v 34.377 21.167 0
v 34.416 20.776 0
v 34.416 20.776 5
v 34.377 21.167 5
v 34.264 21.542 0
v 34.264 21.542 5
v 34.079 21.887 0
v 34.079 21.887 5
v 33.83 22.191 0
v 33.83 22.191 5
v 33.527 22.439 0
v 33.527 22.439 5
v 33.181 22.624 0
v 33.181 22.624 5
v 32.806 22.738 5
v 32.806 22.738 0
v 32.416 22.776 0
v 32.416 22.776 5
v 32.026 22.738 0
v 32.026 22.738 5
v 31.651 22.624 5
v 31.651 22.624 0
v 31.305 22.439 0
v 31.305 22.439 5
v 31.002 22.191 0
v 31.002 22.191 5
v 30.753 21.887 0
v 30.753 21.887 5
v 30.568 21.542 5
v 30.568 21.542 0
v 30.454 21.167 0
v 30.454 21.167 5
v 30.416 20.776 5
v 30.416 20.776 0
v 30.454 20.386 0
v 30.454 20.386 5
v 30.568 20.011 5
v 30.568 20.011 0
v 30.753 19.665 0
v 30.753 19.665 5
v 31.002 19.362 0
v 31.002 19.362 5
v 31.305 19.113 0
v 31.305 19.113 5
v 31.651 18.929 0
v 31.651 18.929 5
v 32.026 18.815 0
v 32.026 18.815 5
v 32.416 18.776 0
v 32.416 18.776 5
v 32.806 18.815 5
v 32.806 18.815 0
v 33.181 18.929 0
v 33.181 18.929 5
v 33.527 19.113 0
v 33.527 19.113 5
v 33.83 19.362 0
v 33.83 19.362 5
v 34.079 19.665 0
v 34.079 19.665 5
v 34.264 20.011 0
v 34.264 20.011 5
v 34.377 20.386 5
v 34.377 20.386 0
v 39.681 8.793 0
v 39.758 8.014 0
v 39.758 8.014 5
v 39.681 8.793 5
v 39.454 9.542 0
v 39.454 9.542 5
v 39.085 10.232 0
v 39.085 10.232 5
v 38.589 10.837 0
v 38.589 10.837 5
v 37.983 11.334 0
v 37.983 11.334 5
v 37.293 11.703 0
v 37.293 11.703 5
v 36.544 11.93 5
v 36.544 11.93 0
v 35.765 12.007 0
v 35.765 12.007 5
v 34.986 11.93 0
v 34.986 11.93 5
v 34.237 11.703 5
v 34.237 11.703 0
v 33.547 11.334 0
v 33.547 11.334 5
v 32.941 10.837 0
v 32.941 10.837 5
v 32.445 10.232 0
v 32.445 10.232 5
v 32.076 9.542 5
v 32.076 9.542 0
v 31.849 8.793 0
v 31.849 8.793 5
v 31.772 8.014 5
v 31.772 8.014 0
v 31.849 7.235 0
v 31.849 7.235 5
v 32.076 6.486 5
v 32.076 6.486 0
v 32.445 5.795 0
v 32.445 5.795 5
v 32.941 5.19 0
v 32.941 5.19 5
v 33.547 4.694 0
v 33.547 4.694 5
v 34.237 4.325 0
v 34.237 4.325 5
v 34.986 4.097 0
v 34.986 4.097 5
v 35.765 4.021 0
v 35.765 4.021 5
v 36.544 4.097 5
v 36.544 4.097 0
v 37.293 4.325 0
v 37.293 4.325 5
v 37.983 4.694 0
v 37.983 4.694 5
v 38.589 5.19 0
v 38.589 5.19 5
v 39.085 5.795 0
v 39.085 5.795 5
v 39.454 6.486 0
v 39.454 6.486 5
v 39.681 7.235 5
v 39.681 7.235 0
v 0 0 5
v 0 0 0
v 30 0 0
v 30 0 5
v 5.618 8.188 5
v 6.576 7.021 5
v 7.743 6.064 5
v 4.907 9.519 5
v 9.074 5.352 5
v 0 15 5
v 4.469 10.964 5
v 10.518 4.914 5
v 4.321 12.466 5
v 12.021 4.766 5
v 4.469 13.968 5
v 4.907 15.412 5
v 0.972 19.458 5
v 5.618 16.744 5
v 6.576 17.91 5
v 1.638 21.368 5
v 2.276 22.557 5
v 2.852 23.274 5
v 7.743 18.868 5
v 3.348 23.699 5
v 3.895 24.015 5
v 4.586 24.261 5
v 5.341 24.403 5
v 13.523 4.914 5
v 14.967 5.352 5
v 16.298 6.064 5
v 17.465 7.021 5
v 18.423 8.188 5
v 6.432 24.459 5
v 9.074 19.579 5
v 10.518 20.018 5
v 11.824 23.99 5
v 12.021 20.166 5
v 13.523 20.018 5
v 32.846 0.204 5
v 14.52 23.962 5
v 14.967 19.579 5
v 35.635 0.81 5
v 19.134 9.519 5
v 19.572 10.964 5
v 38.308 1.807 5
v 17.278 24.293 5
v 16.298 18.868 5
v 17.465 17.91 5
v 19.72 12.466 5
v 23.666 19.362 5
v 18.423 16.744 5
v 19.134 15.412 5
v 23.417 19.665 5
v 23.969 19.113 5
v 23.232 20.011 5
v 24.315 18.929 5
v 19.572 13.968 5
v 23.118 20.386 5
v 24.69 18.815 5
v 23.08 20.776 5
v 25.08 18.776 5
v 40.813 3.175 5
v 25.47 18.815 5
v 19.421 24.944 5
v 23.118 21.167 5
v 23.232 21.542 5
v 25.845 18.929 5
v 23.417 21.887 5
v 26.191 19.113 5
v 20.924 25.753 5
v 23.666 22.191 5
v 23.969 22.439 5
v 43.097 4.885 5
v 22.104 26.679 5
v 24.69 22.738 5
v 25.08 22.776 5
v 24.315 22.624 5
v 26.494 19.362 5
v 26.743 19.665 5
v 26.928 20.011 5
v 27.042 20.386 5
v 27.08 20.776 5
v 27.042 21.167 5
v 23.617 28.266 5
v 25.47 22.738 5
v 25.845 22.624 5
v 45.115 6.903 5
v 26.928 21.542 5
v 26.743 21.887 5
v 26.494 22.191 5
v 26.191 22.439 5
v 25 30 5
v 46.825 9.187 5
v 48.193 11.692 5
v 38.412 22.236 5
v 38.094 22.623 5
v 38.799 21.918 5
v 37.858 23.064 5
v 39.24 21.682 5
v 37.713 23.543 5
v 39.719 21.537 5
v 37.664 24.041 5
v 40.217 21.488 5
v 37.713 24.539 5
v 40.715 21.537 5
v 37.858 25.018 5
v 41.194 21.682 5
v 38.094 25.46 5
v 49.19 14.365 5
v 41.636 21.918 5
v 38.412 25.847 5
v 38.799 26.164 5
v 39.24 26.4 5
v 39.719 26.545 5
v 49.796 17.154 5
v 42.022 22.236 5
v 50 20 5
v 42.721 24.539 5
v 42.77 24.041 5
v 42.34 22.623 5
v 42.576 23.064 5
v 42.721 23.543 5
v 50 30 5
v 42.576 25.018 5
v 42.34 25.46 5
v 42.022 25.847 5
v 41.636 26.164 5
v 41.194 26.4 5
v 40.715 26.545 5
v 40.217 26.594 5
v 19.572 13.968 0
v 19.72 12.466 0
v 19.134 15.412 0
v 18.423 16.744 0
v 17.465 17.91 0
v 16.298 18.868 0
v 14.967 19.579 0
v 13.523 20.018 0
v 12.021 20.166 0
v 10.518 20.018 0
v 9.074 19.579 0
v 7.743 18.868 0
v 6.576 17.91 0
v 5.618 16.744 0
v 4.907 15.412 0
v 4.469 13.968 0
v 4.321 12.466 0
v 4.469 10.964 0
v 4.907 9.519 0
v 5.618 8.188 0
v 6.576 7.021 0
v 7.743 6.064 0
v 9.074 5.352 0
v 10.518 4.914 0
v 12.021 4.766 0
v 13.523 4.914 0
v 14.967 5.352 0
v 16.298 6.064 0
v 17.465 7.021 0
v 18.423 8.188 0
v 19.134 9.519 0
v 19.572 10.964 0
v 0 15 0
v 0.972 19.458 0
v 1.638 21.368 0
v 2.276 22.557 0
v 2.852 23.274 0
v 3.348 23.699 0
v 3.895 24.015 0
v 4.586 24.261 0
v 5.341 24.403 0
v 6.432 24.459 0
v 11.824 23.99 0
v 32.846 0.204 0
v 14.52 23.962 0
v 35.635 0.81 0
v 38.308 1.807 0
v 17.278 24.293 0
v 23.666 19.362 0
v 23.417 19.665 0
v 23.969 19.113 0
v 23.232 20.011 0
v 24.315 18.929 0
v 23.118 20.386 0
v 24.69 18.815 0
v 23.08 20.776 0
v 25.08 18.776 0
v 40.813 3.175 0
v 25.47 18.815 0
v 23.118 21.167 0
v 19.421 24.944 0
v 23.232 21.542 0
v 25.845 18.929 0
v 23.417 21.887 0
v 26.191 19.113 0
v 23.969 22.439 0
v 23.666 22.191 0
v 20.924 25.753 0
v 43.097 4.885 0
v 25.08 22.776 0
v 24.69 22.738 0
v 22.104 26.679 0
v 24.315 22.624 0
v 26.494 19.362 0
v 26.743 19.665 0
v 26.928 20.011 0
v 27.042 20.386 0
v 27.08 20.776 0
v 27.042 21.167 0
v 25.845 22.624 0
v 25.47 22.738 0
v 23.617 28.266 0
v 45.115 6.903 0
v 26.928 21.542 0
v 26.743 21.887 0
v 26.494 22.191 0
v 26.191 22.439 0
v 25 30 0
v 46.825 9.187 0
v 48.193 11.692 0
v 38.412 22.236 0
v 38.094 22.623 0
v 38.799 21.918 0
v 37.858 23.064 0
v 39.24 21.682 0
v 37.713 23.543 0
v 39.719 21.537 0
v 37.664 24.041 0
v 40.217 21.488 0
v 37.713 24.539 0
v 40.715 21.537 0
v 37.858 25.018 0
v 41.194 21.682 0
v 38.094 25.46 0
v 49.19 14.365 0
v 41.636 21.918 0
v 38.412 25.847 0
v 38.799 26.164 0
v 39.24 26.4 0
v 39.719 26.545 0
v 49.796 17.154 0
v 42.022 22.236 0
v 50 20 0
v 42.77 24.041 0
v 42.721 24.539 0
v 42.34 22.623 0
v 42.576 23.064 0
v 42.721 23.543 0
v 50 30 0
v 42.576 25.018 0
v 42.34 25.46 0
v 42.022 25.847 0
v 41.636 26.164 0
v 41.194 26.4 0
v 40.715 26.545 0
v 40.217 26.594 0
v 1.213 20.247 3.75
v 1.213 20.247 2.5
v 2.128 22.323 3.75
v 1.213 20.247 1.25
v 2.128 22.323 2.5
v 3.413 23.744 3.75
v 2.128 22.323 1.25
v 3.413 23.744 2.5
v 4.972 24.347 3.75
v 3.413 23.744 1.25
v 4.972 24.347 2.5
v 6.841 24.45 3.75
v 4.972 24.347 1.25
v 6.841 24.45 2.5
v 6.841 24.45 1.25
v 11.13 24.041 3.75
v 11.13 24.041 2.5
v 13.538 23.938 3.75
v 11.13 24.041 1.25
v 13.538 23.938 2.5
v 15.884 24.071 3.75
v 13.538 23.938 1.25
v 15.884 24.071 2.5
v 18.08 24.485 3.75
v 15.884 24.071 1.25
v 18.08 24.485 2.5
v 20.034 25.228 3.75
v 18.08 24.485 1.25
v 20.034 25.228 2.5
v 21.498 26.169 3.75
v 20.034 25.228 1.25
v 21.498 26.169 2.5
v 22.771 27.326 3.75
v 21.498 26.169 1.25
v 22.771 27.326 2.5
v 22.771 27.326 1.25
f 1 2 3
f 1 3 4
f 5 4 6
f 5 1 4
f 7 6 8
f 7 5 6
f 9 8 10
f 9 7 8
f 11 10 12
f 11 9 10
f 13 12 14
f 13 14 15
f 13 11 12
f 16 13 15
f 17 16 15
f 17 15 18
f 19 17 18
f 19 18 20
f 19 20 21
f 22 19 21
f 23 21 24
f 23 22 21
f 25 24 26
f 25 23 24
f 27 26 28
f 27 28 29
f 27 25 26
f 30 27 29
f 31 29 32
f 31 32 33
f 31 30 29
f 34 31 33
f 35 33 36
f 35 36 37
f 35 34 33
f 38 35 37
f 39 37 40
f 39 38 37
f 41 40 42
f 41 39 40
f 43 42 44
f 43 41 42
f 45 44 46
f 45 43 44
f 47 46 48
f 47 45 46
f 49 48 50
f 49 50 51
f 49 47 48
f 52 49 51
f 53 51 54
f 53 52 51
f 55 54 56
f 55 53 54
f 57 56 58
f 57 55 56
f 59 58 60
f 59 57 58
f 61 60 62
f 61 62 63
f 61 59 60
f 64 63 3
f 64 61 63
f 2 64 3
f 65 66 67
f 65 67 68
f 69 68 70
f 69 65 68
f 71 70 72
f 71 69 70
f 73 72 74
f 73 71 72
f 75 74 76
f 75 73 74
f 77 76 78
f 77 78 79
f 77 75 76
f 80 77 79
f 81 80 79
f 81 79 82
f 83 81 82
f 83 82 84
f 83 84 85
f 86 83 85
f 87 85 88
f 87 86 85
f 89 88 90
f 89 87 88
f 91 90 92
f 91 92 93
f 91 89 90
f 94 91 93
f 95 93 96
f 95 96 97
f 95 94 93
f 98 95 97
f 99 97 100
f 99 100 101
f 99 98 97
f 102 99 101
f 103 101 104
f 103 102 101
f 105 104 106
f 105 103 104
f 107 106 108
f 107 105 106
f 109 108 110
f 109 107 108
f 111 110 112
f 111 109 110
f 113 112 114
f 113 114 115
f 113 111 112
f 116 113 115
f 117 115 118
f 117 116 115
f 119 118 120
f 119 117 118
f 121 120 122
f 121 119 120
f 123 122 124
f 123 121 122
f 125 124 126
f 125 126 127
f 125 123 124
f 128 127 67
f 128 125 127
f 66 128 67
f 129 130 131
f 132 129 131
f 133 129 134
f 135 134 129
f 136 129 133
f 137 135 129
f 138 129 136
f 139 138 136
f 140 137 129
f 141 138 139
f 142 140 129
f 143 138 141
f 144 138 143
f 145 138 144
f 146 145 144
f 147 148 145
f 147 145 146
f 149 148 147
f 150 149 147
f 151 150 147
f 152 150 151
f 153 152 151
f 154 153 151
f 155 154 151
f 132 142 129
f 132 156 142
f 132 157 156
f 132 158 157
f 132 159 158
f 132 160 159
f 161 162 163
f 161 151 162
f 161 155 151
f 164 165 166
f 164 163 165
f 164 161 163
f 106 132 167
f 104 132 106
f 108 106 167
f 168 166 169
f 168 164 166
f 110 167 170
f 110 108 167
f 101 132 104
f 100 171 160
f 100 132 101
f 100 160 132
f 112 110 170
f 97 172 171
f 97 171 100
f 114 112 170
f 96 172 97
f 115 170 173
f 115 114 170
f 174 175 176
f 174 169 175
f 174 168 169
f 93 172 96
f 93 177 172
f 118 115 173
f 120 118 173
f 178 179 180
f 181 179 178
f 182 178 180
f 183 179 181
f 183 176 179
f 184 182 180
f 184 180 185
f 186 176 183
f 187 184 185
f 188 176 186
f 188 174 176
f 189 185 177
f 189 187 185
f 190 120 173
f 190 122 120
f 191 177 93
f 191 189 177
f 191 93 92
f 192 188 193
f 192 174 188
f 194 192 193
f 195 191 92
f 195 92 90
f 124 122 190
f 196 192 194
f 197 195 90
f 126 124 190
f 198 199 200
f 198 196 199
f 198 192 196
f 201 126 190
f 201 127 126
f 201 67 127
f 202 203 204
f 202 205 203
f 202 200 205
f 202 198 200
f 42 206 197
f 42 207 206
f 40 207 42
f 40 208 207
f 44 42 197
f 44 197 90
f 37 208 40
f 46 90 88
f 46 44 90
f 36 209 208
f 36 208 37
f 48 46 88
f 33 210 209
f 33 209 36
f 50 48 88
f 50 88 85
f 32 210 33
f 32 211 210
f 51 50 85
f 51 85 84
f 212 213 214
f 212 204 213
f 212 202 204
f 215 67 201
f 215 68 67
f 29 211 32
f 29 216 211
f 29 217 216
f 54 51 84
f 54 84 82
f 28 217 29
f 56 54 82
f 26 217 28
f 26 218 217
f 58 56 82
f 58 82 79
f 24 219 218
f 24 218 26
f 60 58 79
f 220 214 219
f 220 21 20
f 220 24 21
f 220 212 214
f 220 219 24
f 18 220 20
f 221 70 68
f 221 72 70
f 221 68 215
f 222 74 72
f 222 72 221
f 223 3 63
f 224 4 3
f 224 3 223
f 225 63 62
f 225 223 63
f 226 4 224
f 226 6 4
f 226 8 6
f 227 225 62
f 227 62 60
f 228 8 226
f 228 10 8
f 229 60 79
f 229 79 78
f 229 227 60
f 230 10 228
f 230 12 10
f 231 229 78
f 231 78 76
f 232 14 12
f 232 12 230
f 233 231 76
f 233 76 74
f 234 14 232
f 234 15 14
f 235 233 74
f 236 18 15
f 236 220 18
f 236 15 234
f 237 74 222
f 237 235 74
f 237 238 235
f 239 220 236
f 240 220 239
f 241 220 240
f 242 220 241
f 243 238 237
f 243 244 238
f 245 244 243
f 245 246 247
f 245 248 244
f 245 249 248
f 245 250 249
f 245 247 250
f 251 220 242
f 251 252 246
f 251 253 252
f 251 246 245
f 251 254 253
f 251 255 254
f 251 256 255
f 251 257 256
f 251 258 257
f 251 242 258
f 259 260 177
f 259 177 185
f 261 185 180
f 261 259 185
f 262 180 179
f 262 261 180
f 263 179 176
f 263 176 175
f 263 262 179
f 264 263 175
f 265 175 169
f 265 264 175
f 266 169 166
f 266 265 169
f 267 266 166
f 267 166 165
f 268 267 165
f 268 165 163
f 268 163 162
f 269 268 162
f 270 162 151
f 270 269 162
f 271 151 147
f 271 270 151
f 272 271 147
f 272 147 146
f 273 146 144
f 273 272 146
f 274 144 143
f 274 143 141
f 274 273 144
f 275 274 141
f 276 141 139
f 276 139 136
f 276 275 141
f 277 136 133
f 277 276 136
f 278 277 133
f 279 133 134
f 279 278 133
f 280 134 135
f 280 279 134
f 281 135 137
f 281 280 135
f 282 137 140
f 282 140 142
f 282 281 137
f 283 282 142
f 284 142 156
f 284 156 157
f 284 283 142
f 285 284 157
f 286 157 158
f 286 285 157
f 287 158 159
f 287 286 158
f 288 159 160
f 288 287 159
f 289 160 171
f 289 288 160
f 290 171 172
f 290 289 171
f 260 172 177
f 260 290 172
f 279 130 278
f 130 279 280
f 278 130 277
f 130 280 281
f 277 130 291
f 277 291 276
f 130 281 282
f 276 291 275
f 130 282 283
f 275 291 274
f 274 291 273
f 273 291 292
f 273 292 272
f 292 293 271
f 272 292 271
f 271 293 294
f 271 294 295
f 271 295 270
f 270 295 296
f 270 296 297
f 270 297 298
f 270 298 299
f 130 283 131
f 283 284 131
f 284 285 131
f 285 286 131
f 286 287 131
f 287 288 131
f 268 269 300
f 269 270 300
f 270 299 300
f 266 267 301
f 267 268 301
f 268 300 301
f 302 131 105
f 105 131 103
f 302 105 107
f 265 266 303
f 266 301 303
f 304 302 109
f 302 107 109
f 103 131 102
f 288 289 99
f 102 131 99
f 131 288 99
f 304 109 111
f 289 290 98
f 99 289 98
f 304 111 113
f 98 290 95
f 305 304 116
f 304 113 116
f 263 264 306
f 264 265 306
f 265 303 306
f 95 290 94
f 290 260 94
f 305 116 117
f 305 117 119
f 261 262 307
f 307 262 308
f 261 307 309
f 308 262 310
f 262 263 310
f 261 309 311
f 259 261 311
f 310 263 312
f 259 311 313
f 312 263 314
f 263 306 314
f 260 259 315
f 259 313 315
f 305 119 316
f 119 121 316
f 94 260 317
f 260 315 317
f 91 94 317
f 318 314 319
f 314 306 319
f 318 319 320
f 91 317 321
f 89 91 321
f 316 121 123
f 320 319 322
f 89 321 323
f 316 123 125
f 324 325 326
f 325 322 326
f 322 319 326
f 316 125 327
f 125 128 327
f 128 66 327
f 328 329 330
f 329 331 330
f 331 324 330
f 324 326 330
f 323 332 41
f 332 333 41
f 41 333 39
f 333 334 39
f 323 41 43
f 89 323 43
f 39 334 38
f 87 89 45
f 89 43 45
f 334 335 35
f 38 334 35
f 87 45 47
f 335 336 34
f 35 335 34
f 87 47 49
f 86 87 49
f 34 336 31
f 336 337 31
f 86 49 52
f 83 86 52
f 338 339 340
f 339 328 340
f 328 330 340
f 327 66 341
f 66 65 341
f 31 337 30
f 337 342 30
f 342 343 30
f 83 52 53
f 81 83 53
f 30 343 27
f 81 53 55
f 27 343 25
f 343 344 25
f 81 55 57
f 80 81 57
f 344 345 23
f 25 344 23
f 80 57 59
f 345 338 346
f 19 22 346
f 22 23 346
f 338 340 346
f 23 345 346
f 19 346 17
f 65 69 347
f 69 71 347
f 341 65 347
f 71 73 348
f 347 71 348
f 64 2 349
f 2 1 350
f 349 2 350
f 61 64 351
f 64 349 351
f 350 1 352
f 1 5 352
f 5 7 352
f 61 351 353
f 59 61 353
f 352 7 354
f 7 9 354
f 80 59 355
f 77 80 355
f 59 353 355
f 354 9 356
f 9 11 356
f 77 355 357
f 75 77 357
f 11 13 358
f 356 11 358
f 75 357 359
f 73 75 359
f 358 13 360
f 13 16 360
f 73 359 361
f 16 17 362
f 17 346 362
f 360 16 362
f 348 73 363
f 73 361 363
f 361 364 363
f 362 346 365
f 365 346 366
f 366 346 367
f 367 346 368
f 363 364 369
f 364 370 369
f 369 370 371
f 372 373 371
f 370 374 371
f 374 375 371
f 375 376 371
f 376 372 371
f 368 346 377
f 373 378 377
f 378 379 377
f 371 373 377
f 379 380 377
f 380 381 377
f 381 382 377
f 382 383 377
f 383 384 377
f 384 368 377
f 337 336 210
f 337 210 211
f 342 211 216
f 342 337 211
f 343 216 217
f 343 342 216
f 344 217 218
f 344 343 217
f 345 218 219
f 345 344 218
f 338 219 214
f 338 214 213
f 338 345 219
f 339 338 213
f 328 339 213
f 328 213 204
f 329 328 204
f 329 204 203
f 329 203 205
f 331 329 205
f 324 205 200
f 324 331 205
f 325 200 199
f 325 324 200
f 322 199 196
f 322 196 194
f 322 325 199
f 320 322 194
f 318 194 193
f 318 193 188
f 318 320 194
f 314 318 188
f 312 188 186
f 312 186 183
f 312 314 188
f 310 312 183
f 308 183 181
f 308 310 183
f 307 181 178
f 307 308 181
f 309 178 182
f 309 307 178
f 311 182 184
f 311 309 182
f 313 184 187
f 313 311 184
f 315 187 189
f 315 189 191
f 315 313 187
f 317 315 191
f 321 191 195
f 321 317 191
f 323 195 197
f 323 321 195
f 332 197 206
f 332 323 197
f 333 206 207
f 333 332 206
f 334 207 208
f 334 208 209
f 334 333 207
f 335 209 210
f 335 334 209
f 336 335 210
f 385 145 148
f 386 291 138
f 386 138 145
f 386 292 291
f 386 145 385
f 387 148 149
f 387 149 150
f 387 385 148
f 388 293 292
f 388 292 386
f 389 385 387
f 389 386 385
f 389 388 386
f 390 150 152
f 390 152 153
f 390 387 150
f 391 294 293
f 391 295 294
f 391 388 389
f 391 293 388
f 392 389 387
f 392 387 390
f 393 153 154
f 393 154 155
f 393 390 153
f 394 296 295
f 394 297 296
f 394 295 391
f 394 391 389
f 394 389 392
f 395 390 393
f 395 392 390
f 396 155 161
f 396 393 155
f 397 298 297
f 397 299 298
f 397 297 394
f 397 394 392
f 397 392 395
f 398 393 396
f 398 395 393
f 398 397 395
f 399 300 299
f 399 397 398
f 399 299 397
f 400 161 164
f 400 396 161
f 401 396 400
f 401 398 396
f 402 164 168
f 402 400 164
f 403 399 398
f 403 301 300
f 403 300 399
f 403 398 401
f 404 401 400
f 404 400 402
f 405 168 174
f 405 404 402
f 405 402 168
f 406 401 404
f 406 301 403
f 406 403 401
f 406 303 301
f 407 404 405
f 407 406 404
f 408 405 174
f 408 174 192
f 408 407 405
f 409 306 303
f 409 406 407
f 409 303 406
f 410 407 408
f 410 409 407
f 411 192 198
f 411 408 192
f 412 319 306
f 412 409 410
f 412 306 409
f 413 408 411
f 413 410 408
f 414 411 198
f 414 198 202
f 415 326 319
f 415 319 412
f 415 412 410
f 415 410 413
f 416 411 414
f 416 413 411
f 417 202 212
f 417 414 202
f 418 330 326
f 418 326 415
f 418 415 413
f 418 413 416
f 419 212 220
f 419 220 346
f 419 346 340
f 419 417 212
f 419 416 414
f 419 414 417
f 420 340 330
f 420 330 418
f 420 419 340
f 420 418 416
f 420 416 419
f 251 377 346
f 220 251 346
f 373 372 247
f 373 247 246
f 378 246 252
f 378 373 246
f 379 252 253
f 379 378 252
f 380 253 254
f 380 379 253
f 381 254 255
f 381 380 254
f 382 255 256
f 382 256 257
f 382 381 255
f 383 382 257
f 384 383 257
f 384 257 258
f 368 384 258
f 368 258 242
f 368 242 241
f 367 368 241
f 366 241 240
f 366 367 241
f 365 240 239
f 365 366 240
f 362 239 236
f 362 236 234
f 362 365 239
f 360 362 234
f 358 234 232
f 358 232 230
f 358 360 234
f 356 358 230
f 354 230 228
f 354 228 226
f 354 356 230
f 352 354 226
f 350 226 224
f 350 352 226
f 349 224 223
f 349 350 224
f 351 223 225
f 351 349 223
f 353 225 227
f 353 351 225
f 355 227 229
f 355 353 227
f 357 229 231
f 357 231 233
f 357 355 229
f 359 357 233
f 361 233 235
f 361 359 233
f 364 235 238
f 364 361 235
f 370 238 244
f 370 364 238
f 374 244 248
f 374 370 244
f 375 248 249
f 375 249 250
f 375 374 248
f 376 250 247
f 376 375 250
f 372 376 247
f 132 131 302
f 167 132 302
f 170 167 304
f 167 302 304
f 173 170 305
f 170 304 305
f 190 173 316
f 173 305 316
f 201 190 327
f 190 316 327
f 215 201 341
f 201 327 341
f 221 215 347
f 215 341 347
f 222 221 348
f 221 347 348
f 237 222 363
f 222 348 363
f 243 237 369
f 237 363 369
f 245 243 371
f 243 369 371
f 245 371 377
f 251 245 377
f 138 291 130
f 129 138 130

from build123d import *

# Parameters (mm, degrees)
F0_R     = 7.6997790139
F0_R_2   = 3.9931020536
F0_R_3   = 2
F0_R_4   = 2.5532125323
F1_DEPTH = 5


with BuildPart() as f1:
    # F0 (on Top) → F1 (new body)
    with BuildSketch(Plane.XY):
        with BuildLine():
            Line((0, 15), (0, 0))
            Line((0, 0), (30, 0))
            ThreePointArc((30, 0), (44.1421356237, 5.8578643763), (50, 20))
            Line((50, 20), (50, 30))
            Line((50, 30), (25, 30))
            add(Edge.make_bspline(
                [(0, 15), (0.6988416774, 18.6919691411), (2.0315523911, 25.7326580241), (11.2929241749, 23.5562626748), (20.5075058483, 24.1973604022), (23.5702266181, 28.1532620051), (25, 30)],
                knots=[0, 0, 0, 0, 0.2672508916, 0.5096549591, 0.771091673, 1, 1, 1, 1], degree=3))
        make_face()
        with Locations((12.0205888525, 12.46580109)):
            Circle(F0_R, mode=Mode.SUBTRACT)
        with Locations((35.7649773359, 8.0137299374)):
            Circle(F0_R_2, mode=Mode.SUBTRACT)
        with Locations((25.0799972564, 20.77633515)):
            Circle(F0_R_3, mode=Mode.SUBTRACT)
        with Locations((32.415881753, 20.77633515)):
            Circle(F0_R_3, mode=Mode.SUBTRACT)
        with Locations((40.2170456946, 24.0411870182)):
            Circle(F0_R_4, mode=Mode.SUBTRACT)
    extrude(amount=F1_DEPTH)


solid = f1.part
